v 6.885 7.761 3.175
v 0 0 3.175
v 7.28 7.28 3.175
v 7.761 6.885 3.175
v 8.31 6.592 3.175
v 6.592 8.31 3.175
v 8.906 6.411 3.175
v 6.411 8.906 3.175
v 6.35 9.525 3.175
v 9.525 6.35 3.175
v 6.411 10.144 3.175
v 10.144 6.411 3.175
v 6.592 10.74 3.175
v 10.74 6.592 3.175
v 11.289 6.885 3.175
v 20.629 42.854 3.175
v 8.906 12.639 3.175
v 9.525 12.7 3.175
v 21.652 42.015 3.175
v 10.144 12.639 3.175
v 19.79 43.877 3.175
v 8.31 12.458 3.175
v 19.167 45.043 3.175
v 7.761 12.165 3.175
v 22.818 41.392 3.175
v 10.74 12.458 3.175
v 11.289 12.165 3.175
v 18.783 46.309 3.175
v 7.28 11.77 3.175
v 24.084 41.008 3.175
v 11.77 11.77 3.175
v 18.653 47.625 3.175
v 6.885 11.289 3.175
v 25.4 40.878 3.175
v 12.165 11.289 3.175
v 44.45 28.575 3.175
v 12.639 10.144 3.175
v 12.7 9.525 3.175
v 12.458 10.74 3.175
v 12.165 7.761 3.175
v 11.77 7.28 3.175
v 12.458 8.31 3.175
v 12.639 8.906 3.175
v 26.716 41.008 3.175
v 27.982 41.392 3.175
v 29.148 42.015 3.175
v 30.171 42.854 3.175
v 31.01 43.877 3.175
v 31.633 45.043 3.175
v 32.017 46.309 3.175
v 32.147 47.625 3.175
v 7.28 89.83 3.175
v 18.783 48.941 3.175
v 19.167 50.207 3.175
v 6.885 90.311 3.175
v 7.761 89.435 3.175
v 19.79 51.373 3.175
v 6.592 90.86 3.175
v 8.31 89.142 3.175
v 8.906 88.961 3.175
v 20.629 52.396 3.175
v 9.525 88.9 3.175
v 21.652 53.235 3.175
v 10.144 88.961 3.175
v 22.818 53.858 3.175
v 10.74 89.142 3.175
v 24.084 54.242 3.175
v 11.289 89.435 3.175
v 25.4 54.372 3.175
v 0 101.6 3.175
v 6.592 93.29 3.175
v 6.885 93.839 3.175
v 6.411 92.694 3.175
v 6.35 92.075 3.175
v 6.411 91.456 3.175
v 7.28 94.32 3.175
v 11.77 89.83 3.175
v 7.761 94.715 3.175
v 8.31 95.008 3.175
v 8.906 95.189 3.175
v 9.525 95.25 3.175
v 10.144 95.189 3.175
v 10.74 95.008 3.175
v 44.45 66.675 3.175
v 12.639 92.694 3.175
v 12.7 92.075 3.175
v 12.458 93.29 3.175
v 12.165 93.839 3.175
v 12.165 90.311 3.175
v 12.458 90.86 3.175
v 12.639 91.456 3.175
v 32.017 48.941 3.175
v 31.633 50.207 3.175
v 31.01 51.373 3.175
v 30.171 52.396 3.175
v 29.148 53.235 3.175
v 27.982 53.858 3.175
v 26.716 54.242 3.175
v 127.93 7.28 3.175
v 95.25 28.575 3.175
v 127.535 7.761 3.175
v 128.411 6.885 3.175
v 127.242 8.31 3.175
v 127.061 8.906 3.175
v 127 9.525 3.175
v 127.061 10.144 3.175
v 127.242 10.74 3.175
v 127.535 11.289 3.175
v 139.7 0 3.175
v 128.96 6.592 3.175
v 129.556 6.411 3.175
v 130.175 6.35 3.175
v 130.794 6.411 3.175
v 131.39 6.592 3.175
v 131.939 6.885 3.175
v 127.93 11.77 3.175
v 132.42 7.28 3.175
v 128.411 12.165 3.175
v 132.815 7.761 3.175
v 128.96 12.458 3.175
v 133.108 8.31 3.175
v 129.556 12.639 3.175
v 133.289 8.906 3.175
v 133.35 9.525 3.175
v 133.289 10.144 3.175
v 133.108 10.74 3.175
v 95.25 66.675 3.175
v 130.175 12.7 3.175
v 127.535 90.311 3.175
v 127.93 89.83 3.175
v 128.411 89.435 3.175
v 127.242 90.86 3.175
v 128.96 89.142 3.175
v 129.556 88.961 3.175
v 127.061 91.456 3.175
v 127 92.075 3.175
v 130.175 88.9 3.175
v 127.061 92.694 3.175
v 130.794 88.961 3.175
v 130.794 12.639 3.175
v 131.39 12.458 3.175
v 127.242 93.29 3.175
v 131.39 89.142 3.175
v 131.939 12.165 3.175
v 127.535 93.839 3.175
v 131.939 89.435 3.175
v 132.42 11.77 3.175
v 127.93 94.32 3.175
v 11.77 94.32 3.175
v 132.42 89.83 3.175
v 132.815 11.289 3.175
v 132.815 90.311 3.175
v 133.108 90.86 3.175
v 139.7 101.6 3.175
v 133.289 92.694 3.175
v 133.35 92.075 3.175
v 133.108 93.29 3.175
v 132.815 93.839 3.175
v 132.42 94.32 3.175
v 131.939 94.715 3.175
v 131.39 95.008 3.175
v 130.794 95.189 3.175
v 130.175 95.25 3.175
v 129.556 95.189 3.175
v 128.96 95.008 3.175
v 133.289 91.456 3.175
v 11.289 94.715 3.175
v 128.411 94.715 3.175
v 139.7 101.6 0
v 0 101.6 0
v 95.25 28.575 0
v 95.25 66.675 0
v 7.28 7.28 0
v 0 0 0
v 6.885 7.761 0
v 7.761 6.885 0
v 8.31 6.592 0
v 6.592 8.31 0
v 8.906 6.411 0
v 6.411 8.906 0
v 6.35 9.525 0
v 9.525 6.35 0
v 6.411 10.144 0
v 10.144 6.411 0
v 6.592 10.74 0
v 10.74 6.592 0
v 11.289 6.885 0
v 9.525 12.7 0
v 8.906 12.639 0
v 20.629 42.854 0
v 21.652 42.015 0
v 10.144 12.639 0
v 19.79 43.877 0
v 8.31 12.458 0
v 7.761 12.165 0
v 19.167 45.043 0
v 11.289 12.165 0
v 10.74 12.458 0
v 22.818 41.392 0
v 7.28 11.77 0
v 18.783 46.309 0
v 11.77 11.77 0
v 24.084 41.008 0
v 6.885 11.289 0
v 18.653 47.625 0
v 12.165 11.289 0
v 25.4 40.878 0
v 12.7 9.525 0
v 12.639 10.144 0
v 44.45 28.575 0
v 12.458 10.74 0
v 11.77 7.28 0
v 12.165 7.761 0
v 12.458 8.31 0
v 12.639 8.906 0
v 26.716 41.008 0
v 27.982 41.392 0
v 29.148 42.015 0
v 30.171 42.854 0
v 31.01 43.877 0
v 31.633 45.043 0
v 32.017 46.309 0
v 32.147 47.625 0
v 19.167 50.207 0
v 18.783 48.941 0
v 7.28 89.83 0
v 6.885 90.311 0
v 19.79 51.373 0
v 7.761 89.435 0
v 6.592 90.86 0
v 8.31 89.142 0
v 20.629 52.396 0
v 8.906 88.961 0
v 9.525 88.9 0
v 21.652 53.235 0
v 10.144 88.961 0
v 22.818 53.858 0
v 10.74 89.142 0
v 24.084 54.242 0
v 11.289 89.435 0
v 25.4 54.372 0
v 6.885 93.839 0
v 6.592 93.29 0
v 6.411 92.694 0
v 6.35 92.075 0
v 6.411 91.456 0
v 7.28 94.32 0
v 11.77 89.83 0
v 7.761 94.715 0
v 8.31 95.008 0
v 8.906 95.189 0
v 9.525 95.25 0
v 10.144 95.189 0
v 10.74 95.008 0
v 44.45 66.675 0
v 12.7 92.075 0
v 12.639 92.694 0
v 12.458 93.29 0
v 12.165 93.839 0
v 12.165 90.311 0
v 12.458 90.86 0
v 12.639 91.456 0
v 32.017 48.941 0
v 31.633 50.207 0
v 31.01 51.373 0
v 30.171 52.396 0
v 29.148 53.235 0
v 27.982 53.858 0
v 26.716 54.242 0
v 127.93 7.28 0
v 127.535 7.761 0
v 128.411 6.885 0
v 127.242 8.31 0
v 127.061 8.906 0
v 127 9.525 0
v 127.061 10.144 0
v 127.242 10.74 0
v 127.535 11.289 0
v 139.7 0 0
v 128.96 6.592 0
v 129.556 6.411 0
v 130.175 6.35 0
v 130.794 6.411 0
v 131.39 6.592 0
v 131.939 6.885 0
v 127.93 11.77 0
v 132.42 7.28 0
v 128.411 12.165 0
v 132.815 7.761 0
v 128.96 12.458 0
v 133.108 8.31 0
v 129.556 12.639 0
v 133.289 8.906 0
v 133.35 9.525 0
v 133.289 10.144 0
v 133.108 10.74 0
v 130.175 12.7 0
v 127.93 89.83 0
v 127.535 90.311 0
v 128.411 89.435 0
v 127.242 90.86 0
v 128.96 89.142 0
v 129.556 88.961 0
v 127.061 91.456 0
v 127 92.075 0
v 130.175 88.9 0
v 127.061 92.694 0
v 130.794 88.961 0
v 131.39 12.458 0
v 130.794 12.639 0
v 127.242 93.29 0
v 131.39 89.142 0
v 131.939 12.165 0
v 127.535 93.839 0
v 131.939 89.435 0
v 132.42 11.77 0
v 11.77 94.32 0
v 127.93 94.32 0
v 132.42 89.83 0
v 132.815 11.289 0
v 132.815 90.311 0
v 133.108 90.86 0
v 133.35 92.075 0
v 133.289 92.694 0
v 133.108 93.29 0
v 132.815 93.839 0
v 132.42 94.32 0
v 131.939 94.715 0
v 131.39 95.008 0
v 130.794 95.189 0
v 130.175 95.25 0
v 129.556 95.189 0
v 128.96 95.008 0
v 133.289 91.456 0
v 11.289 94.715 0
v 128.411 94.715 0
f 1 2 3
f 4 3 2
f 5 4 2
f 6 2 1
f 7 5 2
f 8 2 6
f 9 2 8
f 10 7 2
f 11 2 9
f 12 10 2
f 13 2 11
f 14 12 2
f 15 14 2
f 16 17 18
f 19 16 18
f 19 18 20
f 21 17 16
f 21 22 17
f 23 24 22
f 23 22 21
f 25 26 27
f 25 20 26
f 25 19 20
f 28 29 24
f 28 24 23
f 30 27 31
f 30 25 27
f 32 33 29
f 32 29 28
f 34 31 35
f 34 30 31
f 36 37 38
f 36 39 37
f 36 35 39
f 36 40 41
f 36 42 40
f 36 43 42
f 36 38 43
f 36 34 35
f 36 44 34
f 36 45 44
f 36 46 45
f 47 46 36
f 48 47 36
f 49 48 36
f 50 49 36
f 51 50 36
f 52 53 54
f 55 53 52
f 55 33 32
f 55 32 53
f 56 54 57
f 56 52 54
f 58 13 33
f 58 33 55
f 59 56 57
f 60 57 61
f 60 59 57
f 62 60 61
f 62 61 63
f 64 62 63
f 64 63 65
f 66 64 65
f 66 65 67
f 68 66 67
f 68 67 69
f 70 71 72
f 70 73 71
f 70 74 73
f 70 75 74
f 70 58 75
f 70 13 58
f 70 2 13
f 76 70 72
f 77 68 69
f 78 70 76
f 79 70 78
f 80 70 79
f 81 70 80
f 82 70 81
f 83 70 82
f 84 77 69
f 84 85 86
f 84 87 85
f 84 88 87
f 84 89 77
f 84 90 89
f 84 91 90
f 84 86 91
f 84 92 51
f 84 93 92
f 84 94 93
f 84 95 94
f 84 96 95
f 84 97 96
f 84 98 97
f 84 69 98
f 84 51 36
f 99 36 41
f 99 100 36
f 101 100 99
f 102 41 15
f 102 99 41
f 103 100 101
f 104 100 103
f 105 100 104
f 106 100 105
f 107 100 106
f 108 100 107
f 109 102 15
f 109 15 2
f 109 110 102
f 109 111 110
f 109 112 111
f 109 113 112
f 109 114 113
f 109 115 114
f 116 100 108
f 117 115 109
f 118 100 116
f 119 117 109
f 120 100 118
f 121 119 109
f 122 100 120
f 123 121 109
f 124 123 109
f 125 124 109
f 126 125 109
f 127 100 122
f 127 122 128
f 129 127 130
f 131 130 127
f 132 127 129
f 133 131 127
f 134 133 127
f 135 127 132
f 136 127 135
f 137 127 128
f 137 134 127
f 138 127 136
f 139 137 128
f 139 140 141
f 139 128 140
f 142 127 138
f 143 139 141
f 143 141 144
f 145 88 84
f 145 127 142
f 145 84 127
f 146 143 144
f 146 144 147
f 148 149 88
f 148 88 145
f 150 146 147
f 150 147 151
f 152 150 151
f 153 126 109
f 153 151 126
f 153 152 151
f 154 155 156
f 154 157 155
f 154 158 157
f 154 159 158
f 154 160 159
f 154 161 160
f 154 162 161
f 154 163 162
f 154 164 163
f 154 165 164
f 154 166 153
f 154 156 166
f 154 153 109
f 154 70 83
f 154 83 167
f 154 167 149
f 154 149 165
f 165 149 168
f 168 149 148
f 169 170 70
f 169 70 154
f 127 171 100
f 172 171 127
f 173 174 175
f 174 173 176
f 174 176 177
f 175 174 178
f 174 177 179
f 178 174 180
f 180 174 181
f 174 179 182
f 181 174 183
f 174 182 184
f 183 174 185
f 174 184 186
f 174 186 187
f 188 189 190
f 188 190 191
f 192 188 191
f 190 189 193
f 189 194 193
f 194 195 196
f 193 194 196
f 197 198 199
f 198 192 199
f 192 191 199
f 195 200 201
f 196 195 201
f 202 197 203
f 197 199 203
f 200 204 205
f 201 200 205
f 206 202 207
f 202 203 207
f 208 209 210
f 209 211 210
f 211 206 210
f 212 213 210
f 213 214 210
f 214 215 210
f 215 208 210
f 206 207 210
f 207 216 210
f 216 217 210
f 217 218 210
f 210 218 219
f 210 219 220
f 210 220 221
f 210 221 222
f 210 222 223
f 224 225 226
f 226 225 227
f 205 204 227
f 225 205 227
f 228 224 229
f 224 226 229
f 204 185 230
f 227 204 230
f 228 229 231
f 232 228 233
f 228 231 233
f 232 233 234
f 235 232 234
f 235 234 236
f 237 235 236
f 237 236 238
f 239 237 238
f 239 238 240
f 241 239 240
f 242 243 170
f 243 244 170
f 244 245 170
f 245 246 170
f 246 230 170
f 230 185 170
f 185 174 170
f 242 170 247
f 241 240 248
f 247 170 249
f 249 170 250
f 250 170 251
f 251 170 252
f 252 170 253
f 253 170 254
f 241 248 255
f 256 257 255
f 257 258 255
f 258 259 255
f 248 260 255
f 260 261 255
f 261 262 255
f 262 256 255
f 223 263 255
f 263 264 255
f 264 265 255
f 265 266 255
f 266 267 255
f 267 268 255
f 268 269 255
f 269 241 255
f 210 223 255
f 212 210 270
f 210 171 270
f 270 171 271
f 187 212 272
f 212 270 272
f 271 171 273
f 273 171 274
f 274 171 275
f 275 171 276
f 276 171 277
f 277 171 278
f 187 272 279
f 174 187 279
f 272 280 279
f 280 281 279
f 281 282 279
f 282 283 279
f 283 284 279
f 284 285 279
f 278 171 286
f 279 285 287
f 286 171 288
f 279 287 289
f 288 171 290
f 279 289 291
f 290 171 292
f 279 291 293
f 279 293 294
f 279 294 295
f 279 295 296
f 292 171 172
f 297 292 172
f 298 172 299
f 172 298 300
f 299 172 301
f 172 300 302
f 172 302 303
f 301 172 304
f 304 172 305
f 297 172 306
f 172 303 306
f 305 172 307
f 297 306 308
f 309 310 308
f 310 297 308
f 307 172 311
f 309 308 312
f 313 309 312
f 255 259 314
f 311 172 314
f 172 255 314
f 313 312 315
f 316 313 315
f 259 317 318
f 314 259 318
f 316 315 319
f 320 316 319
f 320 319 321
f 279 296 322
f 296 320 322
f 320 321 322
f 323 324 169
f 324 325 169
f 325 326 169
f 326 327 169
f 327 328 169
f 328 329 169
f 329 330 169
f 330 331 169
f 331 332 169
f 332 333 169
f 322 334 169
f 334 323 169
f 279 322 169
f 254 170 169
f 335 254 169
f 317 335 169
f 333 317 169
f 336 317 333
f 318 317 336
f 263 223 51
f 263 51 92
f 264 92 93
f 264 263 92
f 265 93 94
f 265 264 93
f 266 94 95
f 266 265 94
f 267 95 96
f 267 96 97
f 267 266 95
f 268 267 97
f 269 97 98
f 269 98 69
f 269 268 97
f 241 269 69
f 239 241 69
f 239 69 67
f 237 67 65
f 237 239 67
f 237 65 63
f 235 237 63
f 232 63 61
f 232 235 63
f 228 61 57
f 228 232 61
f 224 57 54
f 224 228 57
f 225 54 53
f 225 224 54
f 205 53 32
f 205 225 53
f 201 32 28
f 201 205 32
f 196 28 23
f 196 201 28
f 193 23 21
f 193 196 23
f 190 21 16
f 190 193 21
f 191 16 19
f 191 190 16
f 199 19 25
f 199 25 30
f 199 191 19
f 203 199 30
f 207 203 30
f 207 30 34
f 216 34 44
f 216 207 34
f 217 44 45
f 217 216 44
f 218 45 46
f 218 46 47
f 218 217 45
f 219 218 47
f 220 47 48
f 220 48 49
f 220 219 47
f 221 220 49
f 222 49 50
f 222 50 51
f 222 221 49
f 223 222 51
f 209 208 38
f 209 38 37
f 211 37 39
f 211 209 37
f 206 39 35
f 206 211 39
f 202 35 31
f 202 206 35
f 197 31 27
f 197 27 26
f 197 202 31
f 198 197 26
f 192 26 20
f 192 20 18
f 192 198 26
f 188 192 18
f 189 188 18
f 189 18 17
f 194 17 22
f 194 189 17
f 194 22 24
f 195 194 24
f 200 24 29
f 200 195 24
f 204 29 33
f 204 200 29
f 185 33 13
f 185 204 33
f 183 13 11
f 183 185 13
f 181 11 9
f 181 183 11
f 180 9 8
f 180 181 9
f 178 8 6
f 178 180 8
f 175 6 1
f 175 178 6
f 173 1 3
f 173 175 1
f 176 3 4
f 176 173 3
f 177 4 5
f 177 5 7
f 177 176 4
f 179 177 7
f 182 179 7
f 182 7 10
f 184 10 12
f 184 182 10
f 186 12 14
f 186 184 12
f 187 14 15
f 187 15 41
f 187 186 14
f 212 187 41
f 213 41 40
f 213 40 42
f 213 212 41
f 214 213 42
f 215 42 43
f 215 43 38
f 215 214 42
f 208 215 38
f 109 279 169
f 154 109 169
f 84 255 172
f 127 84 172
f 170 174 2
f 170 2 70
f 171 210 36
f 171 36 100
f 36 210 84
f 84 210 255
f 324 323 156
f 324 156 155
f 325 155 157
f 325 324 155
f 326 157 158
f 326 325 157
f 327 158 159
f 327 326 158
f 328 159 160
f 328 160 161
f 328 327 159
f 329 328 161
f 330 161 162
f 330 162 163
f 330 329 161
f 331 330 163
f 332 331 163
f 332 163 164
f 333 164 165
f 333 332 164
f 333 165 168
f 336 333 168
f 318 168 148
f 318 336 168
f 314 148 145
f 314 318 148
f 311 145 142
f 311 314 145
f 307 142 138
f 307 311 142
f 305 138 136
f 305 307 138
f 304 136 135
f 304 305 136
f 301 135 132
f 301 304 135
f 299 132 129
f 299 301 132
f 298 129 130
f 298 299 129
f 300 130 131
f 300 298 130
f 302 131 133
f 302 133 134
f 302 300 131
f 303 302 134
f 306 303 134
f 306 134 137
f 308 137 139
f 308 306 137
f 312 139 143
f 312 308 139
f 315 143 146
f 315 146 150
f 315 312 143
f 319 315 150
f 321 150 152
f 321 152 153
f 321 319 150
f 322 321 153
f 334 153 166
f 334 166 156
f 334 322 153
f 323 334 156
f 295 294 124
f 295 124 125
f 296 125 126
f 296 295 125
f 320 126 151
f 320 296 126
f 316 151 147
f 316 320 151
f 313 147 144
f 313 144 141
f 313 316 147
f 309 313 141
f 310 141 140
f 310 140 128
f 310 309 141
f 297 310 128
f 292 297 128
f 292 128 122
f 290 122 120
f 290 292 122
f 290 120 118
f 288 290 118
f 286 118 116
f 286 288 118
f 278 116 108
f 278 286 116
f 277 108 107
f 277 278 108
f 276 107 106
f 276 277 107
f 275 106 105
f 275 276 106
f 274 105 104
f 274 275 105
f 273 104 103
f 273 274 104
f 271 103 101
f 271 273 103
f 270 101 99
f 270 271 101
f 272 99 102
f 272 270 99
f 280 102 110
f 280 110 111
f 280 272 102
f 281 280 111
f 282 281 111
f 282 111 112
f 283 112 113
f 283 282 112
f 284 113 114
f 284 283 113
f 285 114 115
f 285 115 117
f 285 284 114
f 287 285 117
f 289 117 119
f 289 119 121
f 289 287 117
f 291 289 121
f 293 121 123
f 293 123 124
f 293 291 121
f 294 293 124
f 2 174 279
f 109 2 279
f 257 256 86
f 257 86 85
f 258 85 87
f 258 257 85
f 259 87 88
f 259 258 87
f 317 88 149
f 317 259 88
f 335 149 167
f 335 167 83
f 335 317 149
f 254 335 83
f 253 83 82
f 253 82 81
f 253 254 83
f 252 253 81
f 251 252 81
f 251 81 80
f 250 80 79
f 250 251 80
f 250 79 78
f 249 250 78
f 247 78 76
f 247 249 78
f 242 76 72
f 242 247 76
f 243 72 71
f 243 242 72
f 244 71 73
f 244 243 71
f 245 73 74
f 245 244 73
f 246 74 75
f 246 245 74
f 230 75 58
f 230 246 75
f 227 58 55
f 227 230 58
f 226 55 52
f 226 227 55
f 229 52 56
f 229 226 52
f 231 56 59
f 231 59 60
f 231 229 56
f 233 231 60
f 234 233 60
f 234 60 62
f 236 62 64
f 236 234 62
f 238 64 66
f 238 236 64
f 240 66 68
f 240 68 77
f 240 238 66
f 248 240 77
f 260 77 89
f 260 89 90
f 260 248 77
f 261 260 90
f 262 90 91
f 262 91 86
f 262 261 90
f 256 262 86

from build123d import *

# Parameters (mm, degrees)
F0_W     = 139.7
F0_H     = 101.6
F0_R     = 3.175
F0_R_2   = 6.746875
F0_W_2   = 50.8
F0_H_2   = 38.1
F1_DEPTH = 3.175


# Not quite as in the source:
# - a feature names something its author has since deleted; it is built from what else it names


with BuildPart() as f1:
    # F0 (on Top) → F1 (new body)
    with BuildSketch(Plane.XY):
        with Locations((69.85, 50.8)):
            Rectangle(F0_W, F0_H)
        with Locations((9.525, 9.525)):
            Circle(F0_R, mode=Mode.SUBTRACT)
        with Locations((25.4, 47.625)):
            Circle(F0_R_2, mode=Mode.SUBTRACT)
        with Locations((130.175, 9.525)):
            Circle(F0_R, mode=Mode.SUBTRACT)
        with Locations((69.85, 47.625)):
            Rectangle(F0_W_2, F0_H_2, mode=Mode.SUBTRACT)
        with Locations((9.525, 92.075)):
            Circle(F0_R, mode=Mode.SUBTRACT)
        with Locations((130.175, 92.075)):
            Circle(F0_R, mode=Mode.SUBTRACT)
    extrude(amount=F1_DEPTH)


solid = f1.part
